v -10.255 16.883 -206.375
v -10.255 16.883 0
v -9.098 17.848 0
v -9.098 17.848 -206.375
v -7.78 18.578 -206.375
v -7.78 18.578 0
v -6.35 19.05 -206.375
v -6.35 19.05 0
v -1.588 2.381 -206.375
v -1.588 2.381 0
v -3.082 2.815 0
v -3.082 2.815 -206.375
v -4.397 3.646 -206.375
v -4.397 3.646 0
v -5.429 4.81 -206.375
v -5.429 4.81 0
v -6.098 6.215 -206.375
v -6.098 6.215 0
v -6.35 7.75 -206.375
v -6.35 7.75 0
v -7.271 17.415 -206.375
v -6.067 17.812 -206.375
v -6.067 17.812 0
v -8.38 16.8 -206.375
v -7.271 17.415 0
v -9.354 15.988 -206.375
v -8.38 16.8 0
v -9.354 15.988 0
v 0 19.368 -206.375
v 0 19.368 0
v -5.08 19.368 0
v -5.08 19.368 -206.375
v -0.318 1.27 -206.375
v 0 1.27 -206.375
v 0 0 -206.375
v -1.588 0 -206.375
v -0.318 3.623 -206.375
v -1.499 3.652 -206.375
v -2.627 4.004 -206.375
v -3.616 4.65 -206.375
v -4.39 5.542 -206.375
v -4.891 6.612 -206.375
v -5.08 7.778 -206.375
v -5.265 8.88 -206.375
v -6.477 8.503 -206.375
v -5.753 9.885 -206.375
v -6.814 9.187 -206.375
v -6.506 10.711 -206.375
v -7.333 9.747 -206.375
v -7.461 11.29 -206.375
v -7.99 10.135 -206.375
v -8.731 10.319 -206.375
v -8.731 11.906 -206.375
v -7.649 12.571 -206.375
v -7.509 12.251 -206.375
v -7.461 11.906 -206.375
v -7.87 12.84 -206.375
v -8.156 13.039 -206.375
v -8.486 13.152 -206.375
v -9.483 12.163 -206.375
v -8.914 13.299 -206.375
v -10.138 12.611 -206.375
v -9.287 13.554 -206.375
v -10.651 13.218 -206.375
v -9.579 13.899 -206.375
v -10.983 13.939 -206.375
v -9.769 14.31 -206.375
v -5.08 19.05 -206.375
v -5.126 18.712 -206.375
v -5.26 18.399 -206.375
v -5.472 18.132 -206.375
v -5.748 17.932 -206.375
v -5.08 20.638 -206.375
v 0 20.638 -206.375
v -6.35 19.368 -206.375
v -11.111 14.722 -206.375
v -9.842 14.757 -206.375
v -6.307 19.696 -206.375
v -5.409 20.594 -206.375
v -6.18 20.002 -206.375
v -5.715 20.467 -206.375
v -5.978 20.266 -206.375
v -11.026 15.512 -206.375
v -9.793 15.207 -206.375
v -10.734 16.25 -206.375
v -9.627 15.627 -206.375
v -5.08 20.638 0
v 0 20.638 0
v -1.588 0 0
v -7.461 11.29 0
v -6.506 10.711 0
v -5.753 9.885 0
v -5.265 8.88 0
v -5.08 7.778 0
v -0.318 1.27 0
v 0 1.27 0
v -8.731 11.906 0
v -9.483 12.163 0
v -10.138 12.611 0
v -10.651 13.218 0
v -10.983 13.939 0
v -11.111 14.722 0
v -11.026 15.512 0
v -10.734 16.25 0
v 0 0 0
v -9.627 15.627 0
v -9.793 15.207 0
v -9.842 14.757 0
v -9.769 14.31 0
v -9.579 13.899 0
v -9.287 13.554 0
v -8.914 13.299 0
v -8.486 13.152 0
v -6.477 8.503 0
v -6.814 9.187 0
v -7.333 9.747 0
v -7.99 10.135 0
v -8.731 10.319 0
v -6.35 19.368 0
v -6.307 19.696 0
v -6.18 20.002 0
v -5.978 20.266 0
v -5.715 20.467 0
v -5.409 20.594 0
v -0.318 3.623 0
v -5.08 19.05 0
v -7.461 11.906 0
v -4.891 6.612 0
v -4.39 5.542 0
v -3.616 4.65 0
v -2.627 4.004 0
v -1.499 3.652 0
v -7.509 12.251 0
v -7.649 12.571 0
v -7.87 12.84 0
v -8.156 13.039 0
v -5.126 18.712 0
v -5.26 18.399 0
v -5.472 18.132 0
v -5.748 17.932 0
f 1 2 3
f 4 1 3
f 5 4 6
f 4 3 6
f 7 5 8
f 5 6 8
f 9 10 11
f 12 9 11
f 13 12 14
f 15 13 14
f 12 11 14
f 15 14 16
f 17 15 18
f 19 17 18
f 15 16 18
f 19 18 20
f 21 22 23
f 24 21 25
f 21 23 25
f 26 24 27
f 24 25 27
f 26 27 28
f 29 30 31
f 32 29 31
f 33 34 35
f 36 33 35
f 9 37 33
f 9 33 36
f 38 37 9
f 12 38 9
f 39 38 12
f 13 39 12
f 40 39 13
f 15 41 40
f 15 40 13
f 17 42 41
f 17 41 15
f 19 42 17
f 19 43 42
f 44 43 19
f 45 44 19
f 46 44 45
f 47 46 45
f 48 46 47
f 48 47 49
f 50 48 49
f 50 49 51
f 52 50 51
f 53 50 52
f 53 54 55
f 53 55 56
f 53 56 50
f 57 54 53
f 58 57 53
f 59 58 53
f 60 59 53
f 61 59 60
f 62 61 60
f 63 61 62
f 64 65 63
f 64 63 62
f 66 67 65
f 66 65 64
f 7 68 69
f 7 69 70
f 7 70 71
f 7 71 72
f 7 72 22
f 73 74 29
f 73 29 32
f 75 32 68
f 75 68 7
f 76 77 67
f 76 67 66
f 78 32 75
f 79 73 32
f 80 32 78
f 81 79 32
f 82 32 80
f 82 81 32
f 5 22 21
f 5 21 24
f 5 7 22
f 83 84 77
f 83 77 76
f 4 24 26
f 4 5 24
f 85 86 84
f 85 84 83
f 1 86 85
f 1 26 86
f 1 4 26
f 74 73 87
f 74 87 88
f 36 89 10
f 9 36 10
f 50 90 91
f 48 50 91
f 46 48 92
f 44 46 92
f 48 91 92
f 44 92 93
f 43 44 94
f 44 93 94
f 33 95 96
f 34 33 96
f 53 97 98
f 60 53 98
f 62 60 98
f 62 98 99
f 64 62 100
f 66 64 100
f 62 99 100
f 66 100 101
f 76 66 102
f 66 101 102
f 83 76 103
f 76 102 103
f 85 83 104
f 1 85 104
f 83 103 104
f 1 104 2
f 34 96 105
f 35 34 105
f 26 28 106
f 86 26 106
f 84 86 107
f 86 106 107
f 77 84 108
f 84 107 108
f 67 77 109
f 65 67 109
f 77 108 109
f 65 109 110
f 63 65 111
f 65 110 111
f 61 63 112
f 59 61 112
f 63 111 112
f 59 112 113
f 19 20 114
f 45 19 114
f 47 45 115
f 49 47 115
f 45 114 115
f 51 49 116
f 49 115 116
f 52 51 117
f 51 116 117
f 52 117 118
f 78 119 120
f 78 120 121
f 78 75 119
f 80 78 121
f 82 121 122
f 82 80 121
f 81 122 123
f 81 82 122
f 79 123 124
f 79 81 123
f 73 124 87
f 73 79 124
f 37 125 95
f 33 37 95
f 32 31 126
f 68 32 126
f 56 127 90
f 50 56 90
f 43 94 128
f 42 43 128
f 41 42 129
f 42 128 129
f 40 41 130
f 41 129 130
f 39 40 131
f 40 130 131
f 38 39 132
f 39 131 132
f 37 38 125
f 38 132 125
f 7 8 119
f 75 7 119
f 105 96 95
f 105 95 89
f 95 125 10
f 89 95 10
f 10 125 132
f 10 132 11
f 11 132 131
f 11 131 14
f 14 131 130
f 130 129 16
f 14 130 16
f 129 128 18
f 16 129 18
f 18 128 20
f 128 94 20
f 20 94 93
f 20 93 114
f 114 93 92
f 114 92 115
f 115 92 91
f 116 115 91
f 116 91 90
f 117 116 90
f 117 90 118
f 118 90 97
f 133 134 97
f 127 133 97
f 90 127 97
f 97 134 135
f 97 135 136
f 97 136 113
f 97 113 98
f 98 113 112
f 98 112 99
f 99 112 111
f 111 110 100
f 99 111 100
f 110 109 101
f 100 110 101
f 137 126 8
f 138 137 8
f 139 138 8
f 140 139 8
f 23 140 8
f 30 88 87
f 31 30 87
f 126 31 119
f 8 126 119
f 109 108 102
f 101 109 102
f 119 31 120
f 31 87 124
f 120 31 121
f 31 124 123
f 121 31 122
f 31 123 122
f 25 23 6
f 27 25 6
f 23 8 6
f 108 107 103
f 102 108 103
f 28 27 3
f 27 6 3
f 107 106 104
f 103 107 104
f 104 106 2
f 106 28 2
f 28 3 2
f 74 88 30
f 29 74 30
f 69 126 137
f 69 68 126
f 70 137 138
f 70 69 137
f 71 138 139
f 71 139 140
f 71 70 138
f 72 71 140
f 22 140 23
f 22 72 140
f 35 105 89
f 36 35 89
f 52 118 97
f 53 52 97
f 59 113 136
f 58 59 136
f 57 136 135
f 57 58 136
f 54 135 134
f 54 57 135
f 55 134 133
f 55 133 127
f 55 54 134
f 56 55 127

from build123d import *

# Parameters (mm, degrees)
EXTRUDE_THIN1_DEPTH = 206.375
FILLET1_R           = 1.27


with BuildPart() as part:
    # Sketch1 → Extrude-Thin1 (new body)
    with BuildSketch(Plane.XY):
        with BuildLine():
            Line((0, 0), (-1.5875, 0))
            Line((-1.5875, 0), (-1.5875, 2.38125))
            ThreePointArc((-1.5875, 2.38125), (-4.95373921, 4.191798454), (-6.35, 7.749902995))
            ThreePointArc((-6.35, 7.749902995), (-7.0533091, 9.486054835), (-8.73125, 10.31875))
            Line((-8.73125, 10.31875), (-8.73125, 11.90625))
            ThreePointArc((-8.73125, 11.90625), (-10.983204711, 13.93861616), (-10.254760064, 16.883303007))
            ThreePointArc((-10.254760064, 16.883303007), (-8.456232552, 18.243920166), (-6.35, 19.05))
            Line((-6.35, 19.05), (-6.35, 20.6375))
            Line((-6.35, 20.6375), (0, 20.6375))
            Line((0, 20.6375), (0, 19.3675))
            Line((0, 19.3675), (-5.08, 19.3675))
            Line((-5.08, 19.3675), (-5.08, 17.961479369))
            ThreePointArc((-5.08, 17.961479369), (-7.394462244, 17.359516713), (-9.353746016, 15.988275809))
            ThreePointArc((-9.353746016, 15.988275809), (-9.540424793, 13.84093001), (-7.46125, 13.272621004))
            Line((-7.46125, 13.272621004), (-7.46125, 11.290352642))
            ThreePointArc((-7.46125, 11.290352642), (-5.752972349, 9.885293584), (-5.080314797, 7.778178184))
            ThreePointArc((-5.080314797, 7.778178184), (-3.615692697, 4.649806034), (-0.3175, 3.623280274))
            Line((-0.3175, 3.623280274), (-0.3175, 1.27))
            Line((-0.3175, 1.27), (0, 1.27))
            Line((0, 1.27), (0, 0))
        make_face()
    extrude(amount=-EXTRUDE_THIN1_DEPTH)

    # Fillet1
    fillet1_edges = [part.edges().sort_by_distance(p)[0] for p in [
        (-5.08, 17.961479369, -103.1875),
        (-7.46125, 13.272621004, -103.1875),
        (-6.35, 20.6375, -103.1875),
    ]]
    fillet(fillet1_edges, radius=FILLET1_R)


solid = part.part
